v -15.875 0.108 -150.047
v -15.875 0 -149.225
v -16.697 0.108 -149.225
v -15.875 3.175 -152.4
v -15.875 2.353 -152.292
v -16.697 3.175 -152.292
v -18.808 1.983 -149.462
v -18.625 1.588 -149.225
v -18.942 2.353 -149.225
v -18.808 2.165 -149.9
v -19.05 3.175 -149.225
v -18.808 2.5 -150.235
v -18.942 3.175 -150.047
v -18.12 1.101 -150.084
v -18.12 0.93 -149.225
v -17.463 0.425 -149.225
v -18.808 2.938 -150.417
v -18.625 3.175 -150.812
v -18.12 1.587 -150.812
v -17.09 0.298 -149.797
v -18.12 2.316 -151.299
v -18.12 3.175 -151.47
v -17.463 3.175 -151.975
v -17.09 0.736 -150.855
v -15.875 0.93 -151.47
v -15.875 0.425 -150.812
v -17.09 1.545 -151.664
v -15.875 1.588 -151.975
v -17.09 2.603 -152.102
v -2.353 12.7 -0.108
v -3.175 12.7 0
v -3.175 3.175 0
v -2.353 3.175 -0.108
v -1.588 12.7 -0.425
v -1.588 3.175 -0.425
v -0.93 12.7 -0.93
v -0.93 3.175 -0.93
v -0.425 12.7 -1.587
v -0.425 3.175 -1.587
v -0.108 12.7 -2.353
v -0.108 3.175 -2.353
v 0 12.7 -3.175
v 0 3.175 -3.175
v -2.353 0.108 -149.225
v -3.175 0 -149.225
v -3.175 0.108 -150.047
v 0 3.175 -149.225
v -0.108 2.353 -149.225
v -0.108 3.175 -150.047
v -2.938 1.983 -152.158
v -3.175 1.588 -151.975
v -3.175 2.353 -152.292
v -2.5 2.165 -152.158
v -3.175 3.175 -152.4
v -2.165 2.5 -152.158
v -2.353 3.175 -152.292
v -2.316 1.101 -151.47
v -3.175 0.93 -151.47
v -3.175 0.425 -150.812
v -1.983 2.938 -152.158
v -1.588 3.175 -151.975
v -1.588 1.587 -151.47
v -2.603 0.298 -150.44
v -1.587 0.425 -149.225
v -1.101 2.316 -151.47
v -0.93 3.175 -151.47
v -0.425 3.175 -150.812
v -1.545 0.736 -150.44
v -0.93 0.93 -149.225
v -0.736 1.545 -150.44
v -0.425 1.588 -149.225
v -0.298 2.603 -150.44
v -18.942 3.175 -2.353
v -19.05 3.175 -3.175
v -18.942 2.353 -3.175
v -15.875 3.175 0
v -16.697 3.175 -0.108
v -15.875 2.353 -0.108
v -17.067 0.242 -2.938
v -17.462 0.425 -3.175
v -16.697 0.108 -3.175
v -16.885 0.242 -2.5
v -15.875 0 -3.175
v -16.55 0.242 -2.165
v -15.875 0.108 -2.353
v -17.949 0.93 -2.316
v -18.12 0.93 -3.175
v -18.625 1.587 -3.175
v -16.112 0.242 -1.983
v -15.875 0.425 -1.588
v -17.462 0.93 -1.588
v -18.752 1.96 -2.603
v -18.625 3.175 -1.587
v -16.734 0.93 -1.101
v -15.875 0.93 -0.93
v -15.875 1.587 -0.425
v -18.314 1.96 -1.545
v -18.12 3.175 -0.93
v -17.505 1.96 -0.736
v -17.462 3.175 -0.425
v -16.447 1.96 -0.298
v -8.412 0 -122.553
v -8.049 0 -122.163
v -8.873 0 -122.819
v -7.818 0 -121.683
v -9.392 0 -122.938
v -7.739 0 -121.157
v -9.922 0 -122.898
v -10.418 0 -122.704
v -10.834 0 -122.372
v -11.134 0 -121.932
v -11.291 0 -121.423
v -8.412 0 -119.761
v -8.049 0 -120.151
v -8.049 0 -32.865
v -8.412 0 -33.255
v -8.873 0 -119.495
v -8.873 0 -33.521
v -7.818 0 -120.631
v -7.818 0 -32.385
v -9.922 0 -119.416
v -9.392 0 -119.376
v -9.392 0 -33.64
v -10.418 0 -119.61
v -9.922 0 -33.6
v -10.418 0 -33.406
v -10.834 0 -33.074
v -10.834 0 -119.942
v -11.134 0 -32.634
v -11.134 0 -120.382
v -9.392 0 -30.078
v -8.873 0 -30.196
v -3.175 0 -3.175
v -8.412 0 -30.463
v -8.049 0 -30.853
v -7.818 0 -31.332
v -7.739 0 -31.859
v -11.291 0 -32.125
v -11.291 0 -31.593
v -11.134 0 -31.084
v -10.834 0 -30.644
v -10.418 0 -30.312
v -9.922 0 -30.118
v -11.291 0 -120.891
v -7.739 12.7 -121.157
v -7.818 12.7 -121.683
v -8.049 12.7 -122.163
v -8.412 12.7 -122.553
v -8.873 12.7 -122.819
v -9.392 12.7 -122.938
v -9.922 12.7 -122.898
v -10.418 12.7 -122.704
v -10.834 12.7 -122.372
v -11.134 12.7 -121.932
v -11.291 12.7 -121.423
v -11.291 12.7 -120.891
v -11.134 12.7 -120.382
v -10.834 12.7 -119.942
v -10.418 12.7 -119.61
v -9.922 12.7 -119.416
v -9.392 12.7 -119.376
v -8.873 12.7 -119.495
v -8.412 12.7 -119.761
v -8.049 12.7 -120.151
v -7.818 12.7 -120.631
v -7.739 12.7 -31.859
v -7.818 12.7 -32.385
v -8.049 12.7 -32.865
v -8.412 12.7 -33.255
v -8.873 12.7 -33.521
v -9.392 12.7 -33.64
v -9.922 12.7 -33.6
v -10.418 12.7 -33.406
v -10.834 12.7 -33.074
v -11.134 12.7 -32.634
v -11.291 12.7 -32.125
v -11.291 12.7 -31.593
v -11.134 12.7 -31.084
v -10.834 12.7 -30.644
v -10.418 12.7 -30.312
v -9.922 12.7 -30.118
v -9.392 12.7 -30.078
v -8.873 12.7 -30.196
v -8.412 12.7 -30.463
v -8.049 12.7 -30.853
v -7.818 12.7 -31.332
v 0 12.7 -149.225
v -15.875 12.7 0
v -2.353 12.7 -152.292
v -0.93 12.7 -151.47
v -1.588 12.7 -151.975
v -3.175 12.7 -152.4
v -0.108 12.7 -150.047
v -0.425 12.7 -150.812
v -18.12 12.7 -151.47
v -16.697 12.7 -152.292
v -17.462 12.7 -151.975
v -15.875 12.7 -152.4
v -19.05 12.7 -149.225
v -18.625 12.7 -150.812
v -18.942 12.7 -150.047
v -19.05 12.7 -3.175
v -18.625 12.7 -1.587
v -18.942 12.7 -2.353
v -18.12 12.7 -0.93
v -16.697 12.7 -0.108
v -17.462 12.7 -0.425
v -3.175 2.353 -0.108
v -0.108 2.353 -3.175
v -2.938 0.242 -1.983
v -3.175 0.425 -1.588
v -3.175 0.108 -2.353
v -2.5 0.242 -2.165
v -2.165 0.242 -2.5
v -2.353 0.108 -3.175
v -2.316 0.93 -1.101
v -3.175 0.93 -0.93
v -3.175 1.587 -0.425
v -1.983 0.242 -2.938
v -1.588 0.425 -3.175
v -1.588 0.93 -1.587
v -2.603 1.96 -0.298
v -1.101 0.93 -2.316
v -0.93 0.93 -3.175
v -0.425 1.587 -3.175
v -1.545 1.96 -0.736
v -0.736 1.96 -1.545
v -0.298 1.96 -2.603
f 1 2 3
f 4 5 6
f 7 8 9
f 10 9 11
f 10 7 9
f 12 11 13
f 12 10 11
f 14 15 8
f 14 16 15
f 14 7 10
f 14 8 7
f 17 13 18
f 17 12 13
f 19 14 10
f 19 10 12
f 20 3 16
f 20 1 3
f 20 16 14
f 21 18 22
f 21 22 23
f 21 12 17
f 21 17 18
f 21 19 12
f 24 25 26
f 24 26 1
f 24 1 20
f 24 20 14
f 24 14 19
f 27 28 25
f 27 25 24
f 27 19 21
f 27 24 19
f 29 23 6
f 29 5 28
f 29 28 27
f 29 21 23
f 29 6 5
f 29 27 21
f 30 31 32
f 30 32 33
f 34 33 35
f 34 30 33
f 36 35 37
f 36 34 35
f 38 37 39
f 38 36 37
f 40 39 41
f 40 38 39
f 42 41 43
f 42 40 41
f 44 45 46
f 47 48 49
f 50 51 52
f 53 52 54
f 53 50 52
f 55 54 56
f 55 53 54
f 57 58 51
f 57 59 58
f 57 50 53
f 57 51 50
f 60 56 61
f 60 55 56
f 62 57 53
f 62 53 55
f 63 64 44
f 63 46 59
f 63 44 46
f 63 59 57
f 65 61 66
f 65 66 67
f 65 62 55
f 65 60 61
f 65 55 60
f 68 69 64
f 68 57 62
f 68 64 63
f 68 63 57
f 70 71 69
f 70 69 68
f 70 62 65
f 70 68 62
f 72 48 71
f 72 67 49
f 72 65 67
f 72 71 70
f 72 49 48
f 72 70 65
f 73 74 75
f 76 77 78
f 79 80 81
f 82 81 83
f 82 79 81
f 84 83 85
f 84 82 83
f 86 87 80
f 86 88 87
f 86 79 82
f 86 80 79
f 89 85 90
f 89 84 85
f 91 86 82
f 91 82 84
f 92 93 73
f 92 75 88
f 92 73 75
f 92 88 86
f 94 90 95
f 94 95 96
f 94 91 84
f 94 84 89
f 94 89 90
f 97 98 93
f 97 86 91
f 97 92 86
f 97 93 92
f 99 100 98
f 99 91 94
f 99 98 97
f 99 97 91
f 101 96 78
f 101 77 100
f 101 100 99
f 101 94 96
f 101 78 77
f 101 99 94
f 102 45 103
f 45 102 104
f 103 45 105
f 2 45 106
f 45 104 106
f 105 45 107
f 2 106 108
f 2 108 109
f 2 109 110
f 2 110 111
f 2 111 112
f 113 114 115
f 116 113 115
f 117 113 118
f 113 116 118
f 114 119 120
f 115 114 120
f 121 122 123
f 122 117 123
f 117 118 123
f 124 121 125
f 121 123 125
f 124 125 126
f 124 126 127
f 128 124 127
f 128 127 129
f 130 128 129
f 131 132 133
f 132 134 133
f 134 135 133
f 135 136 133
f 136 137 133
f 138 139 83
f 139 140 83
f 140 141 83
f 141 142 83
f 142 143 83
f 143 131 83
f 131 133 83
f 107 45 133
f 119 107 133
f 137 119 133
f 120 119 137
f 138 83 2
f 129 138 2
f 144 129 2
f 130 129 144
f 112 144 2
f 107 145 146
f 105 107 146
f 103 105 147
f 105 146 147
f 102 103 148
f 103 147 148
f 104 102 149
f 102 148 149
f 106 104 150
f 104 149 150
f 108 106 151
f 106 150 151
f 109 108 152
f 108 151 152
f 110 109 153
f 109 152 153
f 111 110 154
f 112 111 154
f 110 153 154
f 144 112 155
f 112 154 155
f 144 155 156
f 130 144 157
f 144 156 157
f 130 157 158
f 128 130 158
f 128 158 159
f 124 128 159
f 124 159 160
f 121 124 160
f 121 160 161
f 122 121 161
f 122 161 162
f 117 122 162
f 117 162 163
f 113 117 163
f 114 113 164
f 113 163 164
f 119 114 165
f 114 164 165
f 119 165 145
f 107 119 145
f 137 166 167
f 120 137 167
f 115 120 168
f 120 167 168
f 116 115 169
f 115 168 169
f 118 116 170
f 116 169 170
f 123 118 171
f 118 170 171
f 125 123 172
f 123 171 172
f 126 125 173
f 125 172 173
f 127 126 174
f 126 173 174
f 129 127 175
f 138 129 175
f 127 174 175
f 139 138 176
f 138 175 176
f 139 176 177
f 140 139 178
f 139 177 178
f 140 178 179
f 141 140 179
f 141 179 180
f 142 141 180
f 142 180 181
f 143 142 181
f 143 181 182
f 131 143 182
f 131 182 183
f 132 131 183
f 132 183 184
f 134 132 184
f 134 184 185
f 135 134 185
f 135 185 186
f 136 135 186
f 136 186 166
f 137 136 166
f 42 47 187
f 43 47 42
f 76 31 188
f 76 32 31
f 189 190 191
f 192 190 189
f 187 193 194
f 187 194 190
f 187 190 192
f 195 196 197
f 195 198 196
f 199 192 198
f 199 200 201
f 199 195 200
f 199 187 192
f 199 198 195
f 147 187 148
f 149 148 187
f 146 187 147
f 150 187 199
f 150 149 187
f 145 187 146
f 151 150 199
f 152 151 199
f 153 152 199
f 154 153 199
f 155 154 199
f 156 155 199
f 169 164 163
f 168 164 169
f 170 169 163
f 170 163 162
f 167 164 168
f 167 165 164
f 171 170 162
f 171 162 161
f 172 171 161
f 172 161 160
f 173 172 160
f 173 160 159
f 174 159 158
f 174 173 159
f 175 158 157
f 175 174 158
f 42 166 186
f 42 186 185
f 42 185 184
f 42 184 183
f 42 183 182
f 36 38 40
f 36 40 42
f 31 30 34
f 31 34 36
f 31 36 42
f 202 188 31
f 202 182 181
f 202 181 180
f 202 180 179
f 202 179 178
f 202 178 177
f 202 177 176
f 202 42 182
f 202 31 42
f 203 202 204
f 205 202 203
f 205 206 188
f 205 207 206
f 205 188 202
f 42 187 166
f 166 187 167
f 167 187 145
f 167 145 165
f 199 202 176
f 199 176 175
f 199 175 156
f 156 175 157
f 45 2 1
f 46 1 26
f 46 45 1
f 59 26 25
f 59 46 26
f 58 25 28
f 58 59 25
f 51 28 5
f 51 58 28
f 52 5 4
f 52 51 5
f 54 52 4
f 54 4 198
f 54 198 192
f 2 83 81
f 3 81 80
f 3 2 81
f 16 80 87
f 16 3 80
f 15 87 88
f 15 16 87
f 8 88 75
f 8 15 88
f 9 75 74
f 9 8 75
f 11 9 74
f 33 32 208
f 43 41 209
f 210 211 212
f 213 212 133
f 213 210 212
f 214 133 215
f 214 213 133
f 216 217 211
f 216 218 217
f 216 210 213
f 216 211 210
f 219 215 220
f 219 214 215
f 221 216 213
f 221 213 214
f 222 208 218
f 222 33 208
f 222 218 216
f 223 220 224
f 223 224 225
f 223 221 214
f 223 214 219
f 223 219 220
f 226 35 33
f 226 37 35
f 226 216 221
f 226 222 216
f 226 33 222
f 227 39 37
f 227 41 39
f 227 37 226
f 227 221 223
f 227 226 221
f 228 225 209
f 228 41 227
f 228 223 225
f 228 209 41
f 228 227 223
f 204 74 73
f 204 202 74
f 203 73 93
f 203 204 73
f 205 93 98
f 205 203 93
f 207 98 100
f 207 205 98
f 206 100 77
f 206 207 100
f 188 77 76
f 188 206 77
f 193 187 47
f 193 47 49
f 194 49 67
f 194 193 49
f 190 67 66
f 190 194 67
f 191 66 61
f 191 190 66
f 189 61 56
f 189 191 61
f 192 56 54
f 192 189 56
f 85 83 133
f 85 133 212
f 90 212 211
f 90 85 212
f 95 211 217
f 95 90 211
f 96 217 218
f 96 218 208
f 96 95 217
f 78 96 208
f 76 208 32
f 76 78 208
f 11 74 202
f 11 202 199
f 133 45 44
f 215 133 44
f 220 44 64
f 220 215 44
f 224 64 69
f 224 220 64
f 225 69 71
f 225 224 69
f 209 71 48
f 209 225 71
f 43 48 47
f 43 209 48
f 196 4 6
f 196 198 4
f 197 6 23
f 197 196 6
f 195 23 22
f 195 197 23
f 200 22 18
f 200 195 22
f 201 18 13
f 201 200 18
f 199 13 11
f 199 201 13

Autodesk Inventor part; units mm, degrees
ref_plane "YZ Plane" through (0, 0, 0) normal (1, 0, 0) x (0, 1, 0)
ref_plane "XZ Plane" through (0, 0, 0) normal (0, 1, 0) x (-1, 0, 0)
ref_plane "XY Plane" through (0, 0, 0) normal (0, 0, 1) x (1, 0, 0)
sketch "Sketch1" plane through (0, 0, 0) normal (0, 1, 0) x (-1, 0, 0)
  line L0 (0, 0) -> (19.05, 0)
  line L1 (19.05, 0) -> (19.05, -152.4)
  line L2 (19.05, -152.4) -> (0, -152.4)
  line L3 (0, -152.4) -> (0, 0)
  dimension "d0" = 152.4
  dimension "d1" = 19.05
extrude "Extrusion1" add sketch "Sketch1" along normal blind 12.7
sketch "Sketch2" plane through (0, 12.7, 0) normal (0, 1, 0) x (1, 0, 0)
  line L0 (-19.05, 0) -> (0, 0) projected
  line L1 (-19.05, 152.4) -> (-19.05, 0) projected
  line L2 (0, 0) -> (-19.05, 152.4)
  line L3 (0, 0) -> (0, 152.4) projected
  line L4 (-19.05, 0) -> (0, 152.4)
  line L5 (-9.525, 76.2) -> (-9.525, 0)
  line L6 (-9.525, 76.2) -> (-9.525, 152.4)
  line L7 (0, 152.4) -> (-19.05, 152.4) projected
  circle A0 centre (-9.525, 31.8589) radius 1.7859
  circle A1 centre (-9.525, 121.157) radius 1.7859
  dimension "d4" = 3.5719
  dimension "d5" = 3.5719
extrude "Extrusion2" cut sketch "Sketch2" against normal blind 34.925 contours A0 L5 | L5 A0 | A1 L6 | L6 A1
fillet "Fillet1" radius 3.175 8 edges at (0, 6.35, 0) (-19.05, 6.35, 0) (-9.525, 0, 0) (0, 0, -76.2) (0, 6.35, -152.4) (-9.525, 0, -152.4) (-19.05, 6.35, -152.4) (-19.05, 0, -76.2)
